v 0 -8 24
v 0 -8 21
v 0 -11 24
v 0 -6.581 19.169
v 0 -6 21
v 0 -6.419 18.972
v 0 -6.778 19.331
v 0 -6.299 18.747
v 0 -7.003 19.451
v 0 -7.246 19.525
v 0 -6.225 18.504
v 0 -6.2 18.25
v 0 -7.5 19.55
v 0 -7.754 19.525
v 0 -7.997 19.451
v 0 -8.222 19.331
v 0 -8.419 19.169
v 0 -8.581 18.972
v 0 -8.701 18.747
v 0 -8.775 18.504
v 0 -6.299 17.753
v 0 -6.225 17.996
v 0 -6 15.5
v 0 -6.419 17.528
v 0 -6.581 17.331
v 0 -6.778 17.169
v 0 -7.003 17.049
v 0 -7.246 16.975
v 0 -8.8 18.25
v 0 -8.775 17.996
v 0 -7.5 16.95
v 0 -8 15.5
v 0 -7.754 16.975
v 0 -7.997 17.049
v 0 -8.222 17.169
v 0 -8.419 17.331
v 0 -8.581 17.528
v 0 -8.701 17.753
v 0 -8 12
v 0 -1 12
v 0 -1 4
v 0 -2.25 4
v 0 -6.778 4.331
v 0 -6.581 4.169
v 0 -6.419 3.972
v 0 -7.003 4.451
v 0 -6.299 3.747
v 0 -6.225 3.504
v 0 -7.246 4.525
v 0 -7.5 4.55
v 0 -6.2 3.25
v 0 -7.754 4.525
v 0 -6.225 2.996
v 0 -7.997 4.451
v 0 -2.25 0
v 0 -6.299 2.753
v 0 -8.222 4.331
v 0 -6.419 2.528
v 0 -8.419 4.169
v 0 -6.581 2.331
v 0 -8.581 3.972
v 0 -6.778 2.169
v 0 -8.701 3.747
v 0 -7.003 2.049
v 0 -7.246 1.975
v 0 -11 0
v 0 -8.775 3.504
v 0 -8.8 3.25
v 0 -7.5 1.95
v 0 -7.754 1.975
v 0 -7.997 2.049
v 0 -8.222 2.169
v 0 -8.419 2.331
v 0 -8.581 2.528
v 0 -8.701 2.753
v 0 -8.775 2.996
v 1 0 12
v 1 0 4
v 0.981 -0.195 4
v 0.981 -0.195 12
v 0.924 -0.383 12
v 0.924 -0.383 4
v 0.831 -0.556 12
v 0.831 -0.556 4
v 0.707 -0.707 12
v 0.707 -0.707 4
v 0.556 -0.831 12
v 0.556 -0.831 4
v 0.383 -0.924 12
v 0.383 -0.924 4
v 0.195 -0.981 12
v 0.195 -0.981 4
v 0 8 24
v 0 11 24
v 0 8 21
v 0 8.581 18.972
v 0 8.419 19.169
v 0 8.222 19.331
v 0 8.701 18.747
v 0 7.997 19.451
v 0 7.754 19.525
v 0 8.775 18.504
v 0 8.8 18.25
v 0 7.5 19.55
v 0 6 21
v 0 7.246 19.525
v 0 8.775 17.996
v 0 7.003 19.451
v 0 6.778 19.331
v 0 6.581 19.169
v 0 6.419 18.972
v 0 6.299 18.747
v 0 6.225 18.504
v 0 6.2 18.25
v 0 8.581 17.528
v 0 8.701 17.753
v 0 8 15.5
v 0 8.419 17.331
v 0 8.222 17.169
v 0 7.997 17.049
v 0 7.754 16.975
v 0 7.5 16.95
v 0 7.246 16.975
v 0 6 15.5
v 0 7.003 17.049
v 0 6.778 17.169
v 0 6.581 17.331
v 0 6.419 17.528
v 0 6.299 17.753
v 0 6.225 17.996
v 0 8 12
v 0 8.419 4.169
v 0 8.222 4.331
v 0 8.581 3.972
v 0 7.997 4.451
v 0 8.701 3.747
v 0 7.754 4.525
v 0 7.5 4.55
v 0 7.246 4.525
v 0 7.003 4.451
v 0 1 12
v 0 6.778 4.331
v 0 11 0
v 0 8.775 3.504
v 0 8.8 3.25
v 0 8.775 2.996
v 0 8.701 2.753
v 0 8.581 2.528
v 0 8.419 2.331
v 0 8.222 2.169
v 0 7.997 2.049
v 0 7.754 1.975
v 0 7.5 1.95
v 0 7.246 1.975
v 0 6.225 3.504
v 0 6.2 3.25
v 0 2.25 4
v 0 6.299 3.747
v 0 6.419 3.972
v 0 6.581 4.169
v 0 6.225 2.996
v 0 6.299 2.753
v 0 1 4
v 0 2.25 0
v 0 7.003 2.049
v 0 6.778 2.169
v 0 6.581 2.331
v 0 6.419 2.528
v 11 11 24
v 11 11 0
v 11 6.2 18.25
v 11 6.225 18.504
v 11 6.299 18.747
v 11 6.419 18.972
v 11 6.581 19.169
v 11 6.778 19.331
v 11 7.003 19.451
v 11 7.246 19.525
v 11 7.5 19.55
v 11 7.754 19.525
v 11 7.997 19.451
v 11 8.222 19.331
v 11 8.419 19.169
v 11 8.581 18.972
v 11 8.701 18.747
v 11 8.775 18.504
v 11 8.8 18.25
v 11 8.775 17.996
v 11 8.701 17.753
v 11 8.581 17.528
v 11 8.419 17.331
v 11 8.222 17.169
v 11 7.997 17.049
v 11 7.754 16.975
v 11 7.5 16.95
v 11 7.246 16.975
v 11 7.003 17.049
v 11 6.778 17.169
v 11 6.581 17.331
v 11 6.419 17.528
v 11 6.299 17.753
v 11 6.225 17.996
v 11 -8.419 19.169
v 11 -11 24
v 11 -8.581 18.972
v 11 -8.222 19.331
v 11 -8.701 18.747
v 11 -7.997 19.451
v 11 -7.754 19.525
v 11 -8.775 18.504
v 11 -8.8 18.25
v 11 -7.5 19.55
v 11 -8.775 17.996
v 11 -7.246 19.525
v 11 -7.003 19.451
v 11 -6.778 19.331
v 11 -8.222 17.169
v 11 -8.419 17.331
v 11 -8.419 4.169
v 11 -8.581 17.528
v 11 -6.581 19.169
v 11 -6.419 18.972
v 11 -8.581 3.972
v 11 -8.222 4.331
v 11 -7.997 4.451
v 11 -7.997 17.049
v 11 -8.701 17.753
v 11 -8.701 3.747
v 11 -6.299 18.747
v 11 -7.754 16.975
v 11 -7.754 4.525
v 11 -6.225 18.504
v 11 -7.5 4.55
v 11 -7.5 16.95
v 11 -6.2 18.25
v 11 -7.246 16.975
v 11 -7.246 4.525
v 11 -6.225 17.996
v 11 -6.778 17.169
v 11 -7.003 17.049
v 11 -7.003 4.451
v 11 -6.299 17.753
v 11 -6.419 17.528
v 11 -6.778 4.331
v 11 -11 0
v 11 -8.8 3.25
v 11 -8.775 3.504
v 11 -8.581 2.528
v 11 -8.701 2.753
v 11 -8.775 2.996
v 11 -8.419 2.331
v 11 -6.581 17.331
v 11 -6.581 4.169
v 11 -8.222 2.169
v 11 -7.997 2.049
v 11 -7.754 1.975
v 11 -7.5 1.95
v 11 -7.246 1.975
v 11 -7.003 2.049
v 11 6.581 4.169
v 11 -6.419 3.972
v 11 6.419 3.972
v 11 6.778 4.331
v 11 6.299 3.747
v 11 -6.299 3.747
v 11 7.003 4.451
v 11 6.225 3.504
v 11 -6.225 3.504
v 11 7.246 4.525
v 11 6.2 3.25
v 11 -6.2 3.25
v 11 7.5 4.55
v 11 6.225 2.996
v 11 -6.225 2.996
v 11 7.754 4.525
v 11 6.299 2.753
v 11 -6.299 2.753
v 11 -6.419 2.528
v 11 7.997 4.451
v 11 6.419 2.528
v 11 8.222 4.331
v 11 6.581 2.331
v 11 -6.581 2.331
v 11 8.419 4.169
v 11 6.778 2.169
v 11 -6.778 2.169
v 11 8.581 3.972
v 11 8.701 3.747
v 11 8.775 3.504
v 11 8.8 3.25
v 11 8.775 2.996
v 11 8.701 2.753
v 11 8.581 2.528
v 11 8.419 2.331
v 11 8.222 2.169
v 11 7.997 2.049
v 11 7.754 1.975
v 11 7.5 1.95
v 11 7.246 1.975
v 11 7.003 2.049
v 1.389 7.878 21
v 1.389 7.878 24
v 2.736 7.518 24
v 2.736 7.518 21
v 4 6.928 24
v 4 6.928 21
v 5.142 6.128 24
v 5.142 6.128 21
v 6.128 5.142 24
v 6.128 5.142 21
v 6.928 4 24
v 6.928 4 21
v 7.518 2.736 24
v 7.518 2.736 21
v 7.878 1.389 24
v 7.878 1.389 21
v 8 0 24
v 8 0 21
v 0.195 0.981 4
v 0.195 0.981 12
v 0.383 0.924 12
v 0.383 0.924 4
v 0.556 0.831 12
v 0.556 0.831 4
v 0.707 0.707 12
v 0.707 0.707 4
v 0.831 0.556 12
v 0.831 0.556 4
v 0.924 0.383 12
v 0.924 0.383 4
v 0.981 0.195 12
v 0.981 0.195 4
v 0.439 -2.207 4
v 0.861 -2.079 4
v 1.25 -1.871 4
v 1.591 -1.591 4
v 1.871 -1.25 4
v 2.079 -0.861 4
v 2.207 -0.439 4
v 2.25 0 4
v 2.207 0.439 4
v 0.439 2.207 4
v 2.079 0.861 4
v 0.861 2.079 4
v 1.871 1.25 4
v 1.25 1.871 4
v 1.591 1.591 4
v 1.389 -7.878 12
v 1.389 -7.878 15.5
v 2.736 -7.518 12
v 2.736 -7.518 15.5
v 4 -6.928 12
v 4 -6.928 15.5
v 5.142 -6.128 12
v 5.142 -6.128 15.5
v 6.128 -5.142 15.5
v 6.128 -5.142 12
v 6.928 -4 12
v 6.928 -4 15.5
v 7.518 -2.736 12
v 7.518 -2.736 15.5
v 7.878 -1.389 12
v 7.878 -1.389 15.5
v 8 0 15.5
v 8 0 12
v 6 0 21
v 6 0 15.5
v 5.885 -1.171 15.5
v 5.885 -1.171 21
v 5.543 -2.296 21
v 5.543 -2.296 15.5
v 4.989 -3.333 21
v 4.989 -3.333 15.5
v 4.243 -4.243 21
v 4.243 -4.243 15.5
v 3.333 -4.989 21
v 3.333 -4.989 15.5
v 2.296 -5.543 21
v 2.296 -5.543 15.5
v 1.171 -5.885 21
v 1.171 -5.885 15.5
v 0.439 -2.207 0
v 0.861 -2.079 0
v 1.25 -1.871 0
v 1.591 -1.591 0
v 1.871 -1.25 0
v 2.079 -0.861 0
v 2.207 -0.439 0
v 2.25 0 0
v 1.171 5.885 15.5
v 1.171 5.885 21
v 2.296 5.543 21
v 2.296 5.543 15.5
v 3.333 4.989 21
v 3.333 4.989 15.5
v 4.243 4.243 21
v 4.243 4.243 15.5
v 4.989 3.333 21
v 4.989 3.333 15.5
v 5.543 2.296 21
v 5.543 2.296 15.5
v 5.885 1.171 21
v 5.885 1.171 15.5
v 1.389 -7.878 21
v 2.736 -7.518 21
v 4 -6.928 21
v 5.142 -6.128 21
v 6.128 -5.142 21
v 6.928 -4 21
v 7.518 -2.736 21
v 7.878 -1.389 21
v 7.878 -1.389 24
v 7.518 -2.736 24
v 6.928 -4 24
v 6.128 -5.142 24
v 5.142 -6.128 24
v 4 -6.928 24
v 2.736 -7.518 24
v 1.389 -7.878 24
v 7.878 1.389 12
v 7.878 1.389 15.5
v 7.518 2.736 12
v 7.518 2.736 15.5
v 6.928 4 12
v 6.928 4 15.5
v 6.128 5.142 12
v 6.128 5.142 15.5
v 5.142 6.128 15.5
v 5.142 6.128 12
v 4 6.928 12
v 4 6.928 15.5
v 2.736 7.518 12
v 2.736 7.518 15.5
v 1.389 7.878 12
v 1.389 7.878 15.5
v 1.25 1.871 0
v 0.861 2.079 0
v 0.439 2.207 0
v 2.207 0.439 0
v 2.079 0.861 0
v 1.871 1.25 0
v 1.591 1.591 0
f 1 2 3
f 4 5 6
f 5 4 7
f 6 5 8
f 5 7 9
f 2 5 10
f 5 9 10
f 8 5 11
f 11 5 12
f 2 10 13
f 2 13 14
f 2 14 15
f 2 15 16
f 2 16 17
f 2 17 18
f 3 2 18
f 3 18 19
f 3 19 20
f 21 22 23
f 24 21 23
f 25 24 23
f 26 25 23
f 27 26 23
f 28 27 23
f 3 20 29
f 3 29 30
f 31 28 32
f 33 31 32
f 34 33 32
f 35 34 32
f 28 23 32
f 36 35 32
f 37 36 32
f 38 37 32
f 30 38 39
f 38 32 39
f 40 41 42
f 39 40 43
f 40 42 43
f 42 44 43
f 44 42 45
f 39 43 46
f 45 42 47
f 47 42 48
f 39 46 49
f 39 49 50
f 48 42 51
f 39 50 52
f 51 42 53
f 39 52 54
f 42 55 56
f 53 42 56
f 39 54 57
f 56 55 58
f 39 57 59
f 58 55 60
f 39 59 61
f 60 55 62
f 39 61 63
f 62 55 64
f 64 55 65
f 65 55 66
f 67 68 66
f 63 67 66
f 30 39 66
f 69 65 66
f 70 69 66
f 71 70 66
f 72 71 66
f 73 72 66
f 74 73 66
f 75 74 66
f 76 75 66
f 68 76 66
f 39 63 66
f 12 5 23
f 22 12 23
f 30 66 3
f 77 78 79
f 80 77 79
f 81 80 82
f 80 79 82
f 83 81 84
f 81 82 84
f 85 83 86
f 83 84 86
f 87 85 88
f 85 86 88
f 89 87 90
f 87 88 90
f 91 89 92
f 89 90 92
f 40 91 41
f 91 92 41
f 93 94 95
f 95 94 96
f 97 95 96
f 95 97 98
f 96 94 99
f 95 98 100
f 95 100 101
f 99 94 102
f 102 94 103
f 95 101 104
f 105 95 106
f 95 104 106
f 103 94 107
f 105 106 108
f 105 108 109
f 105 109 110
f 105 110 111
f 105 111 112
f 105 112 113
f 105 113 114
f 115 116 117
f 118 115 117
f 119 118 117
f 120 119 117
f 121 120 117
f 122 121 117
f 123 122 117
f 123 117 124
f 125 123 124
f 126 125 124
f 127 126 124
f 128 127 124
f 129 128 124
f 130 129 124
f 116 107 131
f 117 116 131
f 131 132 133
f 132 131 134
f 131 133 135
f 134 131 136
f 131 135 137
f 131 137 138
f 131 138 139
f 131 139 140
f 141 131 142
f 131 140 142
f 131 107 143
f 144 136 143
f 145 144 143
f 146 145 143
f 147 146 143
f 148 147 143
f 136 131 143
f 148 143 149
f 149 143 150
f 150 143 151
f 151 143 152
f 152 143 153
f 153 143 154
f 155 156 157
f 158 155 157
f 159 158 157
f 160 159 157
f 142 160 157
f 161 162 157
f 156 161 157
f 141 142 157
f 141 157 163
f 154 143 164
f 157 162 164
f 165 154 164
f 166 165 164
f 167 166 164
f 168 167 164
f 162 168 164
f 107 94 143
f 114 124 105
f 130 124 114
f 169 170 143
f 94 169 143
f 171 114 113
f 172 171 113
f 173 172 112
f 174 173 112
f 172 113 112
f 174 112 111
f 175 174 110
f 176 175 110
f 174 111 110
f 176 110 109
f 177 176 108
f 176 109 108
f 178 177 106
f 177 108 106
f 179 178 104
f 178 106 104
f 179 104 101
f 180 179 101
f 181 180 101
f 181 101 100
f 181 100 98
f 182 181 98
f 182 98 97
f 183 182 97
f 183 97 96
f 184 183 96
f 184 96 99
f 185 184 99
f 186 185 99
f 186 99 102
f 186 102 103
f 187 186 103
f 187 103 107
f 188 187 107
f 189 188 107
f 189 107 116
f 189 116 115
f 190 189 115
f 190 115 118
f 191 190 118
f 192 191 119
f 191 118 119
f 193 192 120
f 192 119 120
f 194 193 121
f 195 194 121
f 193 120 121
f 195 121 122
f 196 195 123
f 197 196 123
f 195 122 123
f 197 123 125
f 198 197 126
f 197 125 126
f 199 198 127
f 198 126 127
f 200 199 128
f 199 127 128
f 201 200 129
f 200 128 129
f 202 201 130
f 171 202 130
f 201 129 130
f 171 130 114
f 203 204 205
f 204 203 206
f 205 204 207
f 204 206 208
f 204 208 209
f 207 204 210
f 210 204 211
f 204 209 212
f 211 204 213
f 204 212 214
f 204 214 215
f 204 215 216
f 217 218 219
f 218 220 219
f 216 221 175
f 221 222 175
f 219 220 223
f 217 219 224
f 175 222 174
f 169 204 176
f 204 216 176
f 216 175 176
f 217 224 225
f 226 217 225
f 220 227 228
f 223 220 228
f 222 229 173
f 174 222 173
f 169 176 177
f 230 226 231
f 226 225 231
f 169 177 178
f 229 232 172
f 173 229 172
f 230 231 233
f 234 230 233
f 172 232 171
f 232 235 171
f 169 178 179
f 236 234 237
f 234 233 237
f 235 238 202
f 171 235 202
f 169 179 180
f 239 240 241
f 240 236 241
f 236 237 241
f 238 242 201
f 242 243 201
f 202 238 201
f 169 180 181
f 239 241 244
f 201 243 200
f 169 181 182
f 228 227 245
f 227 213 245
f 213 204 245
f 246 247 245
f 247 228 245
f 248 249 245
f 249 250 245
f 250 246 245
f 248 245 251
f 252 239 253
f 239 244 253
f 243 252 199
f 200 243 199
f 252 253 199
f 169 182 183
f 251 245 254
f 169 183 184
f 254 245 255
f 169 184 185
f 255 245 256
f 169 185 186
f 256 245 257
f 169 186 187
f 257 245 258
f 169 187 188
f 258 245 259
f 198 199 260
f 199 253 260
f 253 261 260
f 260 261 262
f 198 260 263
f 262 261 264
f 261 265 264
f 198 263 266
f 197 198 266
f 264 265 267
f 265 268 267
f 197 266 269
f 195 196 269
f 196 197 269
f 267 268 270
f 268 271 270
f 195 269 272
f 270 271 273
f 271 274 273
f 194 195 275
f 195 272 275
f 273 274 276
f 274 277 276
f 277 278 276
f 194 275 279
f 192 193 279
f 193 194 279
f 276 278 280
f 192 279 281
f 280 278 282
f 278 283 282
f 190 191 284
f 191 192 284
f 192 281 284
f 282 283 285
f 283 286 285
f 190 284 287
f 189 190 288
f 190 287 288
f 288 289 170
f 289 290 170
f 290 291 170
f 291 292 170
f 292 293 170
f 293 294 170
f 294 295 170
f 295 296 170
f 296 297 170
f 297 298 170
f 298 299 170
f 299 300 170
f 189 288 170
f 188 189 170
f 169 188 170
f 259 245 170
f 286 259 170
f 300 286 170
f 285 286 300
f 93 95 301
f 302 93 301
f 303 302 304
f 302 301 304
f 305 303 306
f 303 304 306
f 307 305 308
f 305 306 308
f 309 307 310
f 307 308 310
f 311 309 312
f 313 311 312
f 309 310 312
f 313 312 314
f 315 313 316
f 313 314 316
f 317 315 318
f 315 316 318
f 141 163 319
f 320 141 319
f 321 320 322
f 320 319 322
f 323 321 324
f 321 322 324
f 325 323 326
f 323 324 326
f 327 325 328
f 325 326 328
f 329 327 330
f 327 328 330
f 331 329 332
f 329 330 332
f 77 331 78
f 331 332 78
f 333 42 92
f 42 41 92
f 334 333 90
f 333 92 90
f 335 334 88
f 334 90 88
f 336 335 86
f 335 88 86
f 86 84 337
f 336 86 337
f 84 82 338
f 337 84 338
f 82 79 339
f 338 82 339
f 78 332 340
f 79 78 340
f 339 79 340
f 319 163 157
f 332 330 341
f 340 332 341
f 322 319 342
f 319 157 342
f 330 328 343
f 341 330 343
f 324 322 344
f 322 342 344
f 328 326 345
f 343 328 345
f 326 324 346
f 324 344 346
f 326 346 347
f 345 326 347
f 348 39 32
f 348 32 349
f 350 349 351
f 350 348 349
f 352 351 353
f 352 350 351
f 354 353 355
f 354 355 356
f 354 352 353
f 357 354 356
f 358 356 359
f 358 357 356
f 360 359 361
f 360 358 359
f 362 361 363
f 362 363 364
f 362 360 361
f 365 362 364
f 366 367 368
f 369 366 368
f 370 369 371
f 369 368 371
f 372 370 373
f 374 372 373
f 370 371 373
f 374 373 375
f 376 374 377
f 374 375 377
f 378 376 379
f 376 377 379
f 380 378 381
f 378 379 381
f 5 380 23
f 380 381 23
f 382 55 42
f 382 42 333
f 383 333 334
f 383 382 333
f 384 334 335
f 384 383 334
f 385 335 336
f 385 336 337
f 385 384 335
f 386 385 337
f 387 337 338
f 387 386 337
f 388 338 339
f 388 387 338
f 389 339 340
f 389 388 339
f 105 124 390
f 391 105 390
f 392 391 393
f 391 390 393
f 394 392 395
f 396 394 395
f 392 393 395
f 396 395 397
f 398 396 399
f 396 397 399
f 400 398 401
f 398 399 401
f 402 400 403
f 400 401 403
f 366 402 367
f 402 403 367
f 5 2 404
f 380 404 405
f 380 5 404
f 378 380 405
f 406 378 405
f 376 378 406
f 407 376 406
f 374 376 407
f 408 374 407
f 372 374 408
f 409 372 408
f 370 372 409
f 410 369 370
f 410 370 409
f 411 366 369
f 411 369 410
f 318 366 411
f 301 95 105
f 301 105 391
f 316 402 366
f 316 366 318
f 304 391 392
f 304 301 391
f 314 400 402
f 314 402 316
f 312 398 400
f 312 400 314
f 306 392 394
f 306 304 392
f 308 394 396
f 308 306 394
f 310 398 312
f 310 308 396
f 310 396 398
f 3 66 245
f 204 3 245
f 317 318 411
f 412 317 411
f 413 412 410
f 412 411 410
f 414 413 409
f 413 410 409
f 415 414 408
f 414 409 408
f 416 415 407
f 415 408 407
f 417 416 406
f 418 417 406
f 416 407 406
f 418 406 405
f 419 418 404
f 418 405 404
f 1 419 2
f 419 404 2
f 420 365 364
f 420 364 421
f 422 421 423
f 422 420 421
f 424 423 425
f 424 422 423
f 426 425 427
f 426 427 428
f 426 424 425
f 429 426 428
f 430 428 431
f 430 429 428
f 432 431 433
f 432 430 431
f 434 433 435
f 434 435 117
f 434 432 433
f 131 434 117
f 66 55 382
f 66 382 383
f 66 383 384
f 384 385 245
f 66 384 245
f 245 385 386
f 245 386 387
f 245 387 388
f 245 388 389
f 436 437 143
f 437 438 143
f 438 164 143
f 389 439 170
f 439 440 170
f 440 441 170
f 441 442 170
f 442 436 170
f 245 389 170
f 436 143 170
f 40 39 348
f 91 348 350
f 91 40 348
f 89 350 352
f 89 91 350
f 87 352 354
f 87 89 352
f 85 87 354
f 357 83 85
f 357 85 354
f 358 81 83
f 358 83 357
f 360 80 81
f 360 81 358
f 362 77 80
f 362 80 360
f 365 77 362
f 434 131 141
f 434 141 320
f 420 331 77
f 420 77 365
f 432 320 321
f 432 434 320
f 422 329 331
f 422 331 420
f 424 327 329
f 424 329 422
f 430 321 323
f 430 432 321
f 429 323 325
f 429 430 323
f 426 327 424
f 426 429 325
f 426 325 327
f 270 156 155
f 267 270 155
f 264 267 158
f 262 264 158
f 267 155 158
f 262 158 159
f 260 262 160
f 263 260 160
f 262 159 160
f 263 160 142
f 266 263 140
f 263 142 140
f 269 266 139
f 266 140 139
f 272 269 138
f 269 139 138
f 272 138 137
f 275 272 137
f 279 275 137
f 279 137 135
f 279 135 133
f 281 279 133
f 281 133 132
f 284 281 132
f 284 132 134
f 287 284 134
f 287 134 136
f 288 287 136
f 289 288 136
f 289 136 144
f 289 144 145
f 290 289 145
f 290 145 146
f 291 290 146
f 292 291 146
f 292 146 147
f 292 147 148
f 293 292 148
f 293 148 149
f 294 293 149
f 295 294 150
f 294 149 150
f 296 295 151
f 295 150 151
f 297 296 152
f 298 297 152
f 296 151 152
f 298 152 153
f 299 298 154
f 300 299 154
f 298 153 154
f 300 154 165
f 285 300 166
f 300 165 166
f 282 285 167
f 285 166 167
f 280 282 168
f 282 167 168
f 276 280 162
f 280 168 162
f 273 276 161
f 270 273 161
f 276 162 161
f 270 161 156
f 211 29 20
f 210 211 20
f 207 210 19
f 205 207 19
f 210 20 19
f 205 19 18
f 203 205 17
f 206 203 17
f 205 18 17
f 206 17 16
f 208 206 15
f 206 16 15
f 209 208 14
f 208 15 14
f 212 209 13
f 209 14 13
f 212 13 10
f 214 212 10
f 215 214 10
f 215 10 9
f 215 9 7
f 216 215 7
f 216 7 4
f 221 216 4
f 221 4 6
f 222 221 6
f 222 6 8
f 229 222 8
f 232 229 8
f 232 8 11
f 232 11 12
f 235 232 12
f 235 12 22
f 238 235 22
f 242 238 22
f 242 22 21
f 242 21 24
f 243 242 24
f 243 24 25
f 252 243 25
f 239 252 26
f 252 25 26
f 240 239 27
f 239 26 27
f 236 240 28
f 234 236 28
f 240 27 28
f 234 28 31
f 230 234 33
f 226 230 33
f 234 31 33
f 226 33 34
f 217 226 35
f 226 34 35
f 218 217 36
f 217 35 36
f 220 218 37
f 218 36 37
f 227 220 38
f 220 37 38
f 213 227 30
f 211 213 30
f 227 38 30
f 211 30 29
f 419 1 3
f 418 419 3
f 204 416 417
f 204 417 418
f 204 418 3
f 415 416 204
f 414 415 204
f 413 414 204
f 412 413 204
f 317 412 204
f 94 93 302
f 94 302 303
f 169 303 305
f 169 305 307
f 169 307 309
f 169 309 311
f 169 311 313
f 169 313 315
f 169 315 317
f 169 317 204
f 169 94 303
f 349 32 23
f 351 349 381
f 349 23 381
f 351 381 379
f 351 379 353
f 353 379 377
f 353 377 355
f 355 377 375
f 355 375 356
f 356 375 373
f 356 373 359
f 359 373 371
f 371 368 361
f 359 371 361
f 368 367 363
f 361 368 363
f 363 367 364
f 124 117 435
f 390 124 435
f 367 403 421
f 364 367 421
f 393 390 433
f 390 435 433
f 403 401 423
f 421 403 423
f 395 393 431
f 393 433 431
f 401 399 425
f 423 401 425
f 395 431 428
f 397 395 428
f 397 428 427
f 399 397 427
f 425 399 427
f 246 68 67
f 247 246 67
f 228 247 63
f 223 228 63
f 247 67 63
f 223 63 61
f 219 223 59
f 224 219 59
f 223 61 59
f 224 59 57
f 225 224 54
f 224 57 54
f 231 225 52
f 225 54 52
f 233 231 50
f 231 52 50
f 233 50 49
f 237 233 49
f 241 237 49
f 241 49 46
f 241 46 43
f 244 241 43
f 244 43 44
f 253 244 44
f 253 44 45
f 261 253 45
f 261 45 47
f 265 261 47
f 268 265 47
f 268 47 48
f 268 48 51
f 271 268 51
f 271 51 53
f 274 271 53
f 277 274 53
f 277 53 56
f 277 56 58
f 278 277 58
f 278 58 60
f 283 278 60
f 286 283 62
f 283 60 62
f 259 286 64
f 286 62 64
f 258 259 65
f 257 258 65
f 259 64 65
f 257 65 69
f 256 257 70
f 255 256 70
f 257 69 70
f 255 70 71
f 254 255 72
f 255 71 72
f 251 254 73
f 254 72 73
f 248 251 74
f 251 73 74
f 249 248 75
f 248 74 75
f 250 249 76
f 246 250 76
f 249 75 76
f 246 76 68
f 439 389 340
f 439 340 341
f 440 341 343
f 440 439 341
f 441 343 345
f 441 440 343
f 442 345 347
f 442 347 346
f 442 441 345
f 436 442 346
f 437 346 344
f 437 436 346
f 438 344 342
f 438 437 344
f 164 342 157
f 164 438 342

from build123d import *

# Parameters (mm, degrees)
F2_DEPTH = 24
F3_DEPTH = 21
F4_DEPTH = 15.5
F5_DEPTH = 12
F6_DEPTH = 4
F7_R     = 1.3
F8_DEPTH = 11.001


with BuildPart() as f2:
    # F1 (on Top) → F2 (new body)
    with BuildSketch(Plane.XY):
        with BuildLine():
            Line((11, 11), (0, 11))
            Line((0, 11), (0, 8))
            ThreePointArc((0, 8), (5.6568542495, 5.6568542495), (8, 0))
            ThreePointArc((8, 0), (5.6568542495, -5.6568542495), (0, -8))
            Line((0, -8), (0, -11))
            Line((0, -11), (11, -11))
            Line((11, -11), (11, 11))
        make_face()
    extrude(amount=F2_DEPTH)

    # F1 (on Top) → F3 (join)
    with BuildSketch(Plane.XY):
        with BuildLine():
            ThreePointArc((8, 0), (5.6568542495, 5.6568542495), (0, 8))
            Line((0, 8), (0, 6))
            ThreePointArc((0, 6), (4.2426406871, 4.2426406871), (6, 0))
            ThreePointArc((6, 0), (4.2426406871, -4.2426406871), (0, -6))
            Line((0, -6), (0, -8))
            ThreePointArc((0, -8), (5.6568542495, -5.6568542495), (8, 0))
        make_face()
    extrude(amount=F3_DEPTH)

    # F1 (on Top) → F4 (cut)
    with BuildSketch(Plane.XY):
        with BuildLine():
            ThreePointArc((8, 0), (5.6568542495, 5.6568542495), (0, 8))
            Line((0, 8), (0, 6))
            ThreePointArc((0, 6), (4.2426406871, 4.2426406871), (6, 0))
            ThreePointArc((6, 0), (4.2426406871, -4.2426406871), (0, -6))
            Line((0, -6), (0, -8))
            ThreePointArc((0, -8), (5.6568542495, -5.6568542495), (8, 0))
        make_face()
        with BuildLine():
            Line((0, 6), (0, 8))
            ThreePointArc((0, 8), (-8, 0), (0, -8))
            Line((0, -8), (0, -6))
            ThreePointArc((0, -6), (-6, 0), (0, 6))
        make_face()
    extrude(amount=F4_DEPTH, mode=Mode.SUBTRACT)

    # F1 (on Top) → F5 (join)
    with BuildSketch(Plane.XY):
        with BuildLine():
            ThreePointArc((8, 0), (5.6568542495, 5.6568542495), (0, 8))
            Line((0, 8), (0, 6))
            ThreePointArc((0, 6), (4.2426406871, 4.2426406871), (6, 0))
            ThreePointArc((6, 0), (4.2426406871, -4.2426406871), (0, -6))
            Line((0, -6), (0, -8))
            ThreePointArc((0, -8), (5.6568542495, -5.6568542495), (8, 0))
        make_face()
        with BuildLine():
            ThreePointArc((6, 0), (4.2426406871, 4.2426406871), (0, 6))
            Line((0, 6), (0, 2.25))
            ThreePointArc((0, 2.25), (1.5909902577, 1.5909902577), (2.25, 0))
            ThreePointArc((2.25, 0), (1.5909902577, -1.5909902577), (0, -2.25))
            Line((0, -2.25), (0, -6))
            ThreePointArc((0, -6), (4.2426406871, -4.2426406871), (6, 0))
        make_face()
        with BuildLine():
            ThreePointArc((2.25, 0), (1.5909902577, 1.5909902577), (0, 2.25))
            Line((0, 2.25), (0, 1))
            ThreePointArc((0, 1), (0.7071067812, 0.7071067812), (1, 0))
            ThreePointArc((1, 0), (0.7071067812, -0.7071067812), (0, -1))
            Line((0, -1), (0, -2.25))
            ThreePointArc((0, -2.25), (1.5909902577, -1.5909902577), (2.25, 0))
        make_face()
    extrude(amount=F5_DEPTH)

    # F1 (on Top) → F6 (cut)
    with BuildSketch(Plane.XY):
        with BuildLine():
            ThreePointArc((2.25, 0), (1.5909902577, 1.5909902577), (0, 2.25))
            Line((0, 2.25), (0, 1))
            ThreePointArc((0, 1), (0.7071067812, 0.7071067812), (1, 0))
            ThreePointArc((1, 0), (0.7071067812, -0.7071067812), (0, -1))
            Line((0, -1), (0, -2.25))
            ThreePointArc((0, -2.25), (1.5909902577, -1.5909902577), (2.25, 0))
        make_face()
        with BuildLine():
            Line((0, 1), (0, 2.25))
            ThreePointArc((0, 2.25), (-2.25, 0), (0, -2.25))
            Line((0, -2.25), (0, -1))
            ThreePointArc((0, -1), (-1, 0), (0, 1))
        make_face()
    extrude(amount=F6_DEPTH, mode=Mode.SUBTRACT)

    # F7 (on face) → F8 (cut, through all)
    with BuildSketch(Plane(origin=(0, 0, 0), x_dir=(0, -1, 0), z_dir=(-1, 0, 0))):
        with Locations((-7.5, 18.25)):
            Circle(F7_R)
        with Locations((7.5, 18.25)):
            Circle(F7_R)
        with Locations((7.5, 3.25)):
            Circle(F7_R)
        with Locations((-7.5, 3.25)):
            Circle(F7_R)
    extrude(amount=-F8_DEPTH, mode=Mode.SUBTRACT)


solid = f2.part
